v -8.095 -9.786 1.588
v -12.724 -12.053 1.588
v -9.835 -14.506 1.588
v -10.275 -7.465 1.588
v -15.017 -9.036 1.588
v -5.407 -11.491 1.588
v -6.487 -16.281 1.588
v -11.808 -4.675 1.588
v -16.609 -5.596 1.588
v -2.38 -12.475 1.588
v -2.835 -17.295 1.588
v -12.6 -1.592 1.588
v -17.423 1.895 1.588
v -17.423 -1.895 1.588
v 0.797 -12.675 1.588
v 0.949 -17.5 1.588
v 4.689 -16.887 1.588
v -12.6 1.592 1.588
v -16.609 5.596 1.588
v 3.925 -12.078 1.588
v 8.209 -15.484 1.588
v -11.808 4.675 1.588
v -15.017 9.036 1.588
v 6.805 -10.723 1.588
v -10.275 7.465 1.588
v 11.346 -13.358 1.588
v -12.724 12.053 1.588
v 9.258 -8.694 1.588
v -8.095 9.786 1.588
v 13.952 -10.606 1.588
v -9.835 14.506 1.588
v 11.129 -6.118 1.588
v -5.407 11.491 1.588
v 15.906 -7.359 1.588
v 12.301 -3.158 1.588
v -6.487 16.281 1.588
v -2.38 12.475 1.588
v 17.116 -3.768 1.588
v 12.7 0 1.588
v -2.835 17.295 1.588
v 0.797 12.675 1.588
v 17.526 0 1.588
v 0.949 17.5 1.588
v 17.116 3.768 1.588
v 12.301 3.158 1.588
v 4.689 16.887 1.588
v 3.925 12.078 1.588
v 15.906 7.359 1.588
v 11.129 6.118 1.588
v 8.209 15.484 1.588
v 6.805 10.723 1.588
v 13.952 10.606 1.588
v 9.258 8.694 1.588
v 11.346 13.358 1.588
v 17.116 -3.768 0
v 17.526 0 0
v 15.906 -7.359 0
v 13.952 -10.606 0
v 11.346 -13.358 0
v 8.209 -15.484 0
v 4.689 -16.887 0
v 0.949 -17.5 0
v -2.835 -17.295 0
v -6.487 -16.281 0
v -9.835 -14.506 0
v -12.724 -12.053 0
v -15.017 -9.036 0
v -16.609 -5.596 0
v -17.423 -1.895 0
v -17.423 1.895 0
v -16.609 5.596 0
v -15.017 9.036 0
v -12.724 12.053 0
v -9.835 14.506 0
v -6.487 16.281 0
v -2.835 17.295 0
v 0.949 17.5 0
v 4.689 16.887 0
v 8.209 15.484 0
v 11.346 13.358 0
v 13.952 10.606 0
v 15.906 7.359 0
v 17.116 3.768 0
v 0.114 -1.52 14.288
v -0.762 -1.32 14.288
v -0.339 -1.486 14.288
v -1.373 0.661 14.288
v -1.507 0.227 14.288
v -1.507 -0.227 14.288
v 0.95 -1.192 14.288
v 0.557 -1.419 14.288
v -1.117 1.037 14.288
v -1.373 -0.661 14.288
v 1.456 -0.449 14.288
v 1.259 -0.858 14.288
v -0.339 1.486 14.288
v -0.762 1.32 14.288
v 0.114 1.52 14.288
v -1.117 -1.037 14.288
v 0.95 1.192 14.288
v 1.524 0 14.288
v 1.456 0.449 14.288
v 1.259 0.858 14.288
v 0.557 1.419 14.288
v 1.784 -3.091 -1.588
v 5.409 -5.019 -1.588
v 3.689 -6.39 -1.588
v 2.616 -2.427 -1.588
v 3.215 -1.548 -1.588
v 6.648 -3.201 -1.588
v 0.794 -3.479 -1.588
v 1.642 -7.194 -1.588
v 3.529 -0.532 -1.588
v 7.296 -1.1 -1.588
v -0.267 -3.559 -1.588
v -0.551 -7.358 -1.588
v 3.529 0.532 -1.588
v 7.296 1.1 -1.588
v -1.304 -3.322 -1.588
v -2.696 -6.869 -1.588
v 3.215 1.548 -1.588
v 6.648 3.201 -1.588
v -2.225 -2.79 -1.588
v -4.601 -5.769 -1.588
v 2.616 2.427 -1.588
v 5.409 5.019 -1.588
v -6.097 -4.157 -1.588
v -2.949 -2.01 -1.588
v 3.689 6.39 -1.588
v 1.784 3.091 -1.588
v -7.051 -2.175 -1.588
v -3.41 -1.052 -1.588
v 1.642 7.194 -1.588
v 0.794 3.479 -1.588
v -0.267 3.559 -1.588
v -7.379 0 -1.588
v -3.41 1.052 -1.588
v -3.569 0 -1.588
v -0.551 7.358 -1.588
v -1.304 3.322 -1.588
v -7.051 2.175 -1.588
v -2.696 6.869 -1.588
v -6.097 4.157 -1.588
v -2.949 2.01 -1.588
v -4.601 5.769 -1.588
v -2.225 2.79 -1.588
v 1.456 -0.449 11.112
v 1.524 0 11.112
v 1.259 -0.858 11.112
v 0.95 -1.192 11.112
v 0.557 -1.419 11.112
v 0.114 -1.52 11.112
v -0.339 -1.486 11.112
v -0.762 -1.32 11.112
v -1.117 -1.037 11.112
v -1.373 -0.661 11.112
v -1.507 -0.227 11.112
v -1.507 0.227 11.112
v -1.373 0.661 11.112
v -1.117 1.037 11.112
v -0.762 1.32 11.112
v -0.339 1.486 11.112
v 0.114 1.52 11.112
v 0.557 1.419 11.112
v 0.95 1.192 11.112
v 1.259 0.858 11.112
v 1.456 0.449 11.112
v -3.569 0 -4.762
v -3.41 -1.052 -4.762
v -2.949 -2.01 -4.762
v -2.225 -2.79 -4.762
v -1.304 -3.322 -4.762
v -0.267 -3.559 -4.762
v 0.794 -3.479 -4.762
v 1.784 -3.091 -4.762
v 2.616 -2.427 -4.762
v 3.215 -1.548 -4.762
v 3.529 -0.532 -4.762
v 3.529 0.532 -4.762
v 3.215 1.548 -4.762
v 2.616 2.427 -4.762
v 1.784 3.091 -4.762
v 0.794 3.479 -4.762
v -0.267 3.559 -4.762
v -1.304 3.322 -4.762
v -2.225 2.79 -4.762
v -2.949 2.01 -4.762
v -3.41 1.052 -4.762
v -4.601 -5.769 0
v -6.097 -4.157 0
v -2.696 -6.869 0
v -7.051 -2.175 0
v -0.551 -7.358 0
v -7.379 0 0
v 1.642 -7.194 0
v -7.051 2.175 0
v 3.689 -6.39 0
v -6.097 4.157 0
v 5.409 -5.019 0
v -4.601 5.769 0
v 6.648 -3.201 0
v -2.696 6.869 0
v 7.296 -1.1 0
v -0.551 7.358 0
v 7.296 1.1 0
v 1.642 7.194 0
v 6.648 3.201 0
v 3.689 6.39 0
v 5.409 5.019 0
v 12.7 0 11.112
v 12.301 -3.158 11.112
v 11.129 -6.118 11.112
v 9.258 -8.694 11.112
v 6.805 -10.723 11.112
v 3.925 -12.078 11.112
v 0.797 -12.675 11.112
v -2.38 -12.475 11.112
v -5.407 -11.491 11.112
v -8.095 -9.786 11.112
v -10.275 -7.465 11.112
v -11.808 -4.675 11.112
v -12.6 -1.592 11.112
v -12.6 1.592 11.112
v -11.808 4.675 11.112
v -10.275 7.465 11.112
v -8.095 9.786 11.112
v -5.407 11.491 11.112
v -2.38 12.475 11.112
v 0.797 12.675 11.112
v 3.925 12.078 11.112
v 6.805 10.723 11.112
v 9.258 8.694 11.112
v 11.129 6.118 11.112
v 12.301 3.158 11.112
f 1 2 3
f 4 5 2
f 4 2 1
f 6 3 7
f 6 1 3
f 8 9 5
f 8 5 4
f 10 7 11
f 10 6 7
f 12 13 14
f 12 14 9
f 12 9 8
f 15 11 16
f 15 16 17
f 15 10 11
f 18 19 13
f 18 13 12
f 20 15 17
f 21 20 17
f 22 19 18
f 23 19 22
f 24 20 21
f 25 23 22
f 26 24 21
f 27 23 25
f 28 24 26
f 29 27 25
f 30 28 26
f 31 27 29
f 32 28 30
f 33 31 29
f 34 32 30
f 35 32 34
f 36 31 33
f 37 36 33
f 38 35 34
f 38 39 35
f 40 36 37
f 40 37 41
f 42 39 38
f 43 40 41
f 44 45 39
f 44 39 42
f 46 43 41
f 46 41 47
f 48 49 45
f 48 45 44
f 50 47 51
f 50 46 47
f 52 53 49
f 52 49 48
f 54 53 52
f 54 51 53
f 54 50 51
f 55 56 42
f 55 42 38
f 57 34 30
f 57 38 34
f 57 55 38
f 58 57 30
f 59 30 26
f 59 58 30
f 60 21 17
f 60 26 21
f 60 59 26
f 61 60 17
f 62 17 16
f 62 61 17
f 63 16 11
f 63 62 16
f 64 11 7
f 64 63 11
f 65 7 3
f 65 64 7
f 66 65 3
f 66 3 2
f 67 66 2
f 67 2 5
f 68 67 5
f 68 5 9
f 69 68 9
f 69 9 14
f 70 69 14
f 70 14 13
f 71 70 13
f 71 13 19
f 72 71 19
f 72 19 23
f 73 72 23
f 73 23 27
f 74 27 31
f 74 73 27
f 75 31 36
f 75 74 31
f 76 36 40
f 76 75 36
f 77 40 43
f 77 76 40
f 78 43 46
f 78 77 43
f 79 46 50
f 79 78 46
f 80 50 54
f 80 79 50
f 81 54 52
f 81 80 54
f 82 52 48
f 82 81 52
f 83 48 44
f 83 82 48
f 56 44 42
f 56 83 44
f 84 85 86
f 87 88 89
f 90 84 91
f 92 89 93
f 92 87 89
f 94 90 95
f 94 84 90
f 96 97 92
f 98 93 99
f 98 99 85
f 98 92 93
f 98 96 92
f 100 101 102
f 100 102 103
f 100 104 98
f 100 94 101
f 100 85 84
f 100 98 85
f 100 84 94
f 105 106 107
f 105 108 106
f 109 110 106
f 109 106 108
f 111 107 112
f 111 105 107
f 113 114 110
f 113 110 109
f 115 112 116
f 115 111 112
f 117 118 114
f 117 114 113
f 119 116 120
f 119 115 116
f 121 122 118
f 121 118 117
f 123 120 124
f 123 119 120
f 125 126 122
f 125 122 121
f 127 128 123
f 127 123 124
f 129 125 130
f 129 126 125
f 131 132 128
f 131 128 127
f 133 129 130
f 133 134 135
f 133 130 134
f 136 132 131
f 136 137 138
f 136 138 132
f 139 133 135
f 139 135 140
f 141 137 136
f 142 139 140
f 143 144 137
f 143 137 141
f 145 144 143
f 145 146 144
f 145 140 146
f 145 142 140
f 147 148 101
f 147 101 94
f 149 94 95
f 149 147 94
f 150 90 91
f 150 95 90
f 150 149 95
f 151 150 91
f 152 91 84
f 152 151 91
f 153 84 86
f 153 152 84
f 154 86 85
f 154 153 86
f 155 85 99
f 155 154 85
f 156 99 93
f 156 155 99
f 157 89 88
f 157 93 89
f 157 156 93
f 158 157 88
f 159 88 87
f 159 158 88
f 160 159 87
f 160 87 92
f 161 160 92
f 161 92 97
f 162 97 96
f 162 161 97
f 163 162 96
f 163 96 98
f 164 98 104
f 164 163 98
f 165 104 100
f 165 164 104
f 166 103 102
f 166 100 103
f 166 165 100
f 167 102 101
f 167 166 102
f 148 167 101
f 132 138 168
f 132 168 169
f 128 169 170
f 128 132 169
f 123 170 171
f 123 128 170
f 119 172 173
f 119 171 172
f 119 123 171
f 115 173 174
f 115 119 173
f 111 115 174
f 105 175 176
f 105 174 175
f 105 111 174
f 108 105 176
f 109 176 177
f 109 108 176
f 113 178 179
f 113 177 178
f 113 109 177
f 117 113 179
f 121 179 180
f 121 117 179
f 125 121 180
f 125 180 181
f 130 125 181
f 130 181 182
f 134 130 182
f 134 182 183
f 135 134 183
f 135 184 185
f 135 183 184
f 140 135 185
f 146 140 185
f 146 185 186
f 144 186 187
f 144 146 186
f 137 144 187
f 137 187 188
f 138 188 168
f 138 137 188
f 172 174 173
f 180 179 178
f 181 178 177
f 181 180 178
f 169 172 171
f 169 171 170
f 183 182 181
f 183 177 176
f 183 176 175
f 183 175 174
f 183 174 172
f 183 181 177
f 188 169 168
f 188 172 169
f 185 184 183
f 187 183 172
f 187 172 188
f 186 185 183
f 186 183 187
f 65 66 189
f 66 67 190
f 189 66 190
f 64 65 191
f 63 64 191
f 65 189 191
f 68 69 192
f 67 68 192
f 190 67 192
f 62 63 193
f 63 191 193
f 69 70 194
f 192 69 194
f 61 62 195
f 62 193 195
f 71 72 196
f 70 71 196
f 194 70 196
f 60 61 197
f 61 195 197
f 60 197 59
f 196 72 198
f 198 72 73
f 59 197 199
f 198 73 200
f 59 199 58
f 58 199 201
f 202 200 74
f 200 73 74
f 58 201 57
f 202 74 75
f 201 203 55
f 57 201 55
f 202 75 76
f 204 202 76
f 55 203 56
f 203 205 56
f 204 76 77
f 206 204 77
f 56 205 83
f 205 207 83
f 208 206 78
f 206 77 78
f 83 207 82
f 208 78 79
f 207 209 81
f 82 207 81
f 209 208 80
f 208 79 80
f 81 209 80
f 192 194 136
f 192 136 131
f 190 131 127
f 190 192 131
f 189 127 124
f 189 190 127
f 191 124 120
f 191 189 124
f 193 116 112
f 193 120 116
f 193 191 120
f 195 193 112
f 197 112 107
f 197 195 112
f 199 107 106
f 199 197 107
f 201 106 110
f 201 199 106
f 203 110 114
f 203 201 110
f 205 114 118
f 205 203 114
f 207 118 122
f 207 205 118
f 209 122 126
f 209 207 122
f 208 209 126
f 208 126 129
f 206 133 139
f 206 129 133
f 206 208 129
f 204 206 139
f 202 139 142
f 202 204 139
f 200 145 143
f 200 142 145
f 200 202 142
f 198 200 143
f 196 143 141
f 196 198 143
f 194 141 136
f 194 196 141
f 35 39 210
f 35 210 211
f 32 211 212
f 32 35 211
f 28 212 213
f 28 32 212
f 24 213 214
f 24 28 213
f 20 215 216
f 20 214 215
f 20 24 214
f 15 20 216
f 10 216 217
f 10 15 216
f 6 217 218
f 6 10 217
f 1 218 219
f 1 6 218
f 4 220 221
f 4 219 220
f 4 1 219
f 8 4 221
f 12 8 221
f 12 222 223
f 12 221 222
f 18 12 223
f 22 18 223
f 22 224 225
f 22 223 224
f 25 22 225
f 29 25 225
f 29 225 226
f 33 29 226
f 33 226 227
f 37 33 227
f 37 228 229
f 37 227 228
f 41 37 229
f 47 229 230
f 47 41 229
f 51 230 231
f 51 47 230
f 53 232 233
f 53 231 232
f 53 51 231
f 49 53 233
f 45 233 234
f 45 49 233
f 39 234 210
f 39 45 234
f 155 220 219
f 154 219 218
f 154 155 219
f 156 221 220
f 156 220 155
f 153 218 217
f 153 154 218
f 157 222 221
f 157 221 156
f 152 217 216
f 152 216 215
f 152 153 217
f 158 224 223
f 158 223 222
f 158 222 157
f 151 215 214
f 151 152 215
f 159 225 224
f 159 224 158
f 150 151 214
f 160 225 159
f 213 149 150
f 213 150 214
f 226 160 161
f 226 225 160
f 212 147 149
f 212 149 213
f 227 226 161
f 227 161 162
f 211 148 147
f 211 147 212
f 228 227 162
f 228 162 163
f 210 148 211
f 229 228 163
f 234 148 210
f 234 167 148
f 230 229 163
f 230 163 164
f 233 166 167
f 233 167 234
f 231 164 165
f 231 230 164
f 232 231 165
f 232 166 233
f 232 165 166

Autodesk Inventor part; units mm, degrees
ref_plane "YZ Plane" through (0, 0, 0) normal (1, 0, 0) x (0, 1, 0)
ref_plane "XZ Plane" through (0, 0, 0) normal (0, 1, 0) x (-1, 0, 0)
ref_plane "XY Plane" through (0, 0, 0) normal (0, 0, 1) x (1, 0, 0)
sketch "Sketch1" plane through (0, 0, 0) normal (0, 0, 1) x (1, 0, 0)
  circle A0 centre (0, 0) radius 17.526
  dimension "d0" = 35.052
extrude "Extrusion1" add sketch "Sketch1" along normal blind 1.5875
sketch "Sketch2" plane through (0, 0, 1.5875) normal (0, 0, 1) x (1, 0, 0)
  circle A0 centre (0, 0) radius 12.7
  dimension "d3" = 25.4
extrude "Extrusion2" add sketch "Sketch2" along normal blind 9.525
sketch "Sketch3" plane through (0, 0, 0) normal (0, 0, -1) x (-1, 0, 0)
  circle A0 centre (0, 0) radius 7.3787
  dimension "d6" = 14.7574
extrude "Extrusion3" add sketch "Sketch3" along normal blind 1.5875
sketch "Sketch4" plane through (0, 0, -1.5875) normal (0, 0, -1) x (-1, 0, 0)
  circle A0 centre (0, 0) radius 3.5687
  dimension "d9" = 7.1374
extrude "Extrusion4" add sketch "Sketch4" along normal blind 3.175
sketch "Sketch5" plane through (0, 0, 11.1125) normal (0, 0, 1) x (1, 0, 0)
  circle A0 centre (0, 0) radius 1.524
  dimension "d12" = 3.048
extrude "Extrusion5" add sketch "Sketch5" along normal blind 3.175
properties part number "Wheel"
